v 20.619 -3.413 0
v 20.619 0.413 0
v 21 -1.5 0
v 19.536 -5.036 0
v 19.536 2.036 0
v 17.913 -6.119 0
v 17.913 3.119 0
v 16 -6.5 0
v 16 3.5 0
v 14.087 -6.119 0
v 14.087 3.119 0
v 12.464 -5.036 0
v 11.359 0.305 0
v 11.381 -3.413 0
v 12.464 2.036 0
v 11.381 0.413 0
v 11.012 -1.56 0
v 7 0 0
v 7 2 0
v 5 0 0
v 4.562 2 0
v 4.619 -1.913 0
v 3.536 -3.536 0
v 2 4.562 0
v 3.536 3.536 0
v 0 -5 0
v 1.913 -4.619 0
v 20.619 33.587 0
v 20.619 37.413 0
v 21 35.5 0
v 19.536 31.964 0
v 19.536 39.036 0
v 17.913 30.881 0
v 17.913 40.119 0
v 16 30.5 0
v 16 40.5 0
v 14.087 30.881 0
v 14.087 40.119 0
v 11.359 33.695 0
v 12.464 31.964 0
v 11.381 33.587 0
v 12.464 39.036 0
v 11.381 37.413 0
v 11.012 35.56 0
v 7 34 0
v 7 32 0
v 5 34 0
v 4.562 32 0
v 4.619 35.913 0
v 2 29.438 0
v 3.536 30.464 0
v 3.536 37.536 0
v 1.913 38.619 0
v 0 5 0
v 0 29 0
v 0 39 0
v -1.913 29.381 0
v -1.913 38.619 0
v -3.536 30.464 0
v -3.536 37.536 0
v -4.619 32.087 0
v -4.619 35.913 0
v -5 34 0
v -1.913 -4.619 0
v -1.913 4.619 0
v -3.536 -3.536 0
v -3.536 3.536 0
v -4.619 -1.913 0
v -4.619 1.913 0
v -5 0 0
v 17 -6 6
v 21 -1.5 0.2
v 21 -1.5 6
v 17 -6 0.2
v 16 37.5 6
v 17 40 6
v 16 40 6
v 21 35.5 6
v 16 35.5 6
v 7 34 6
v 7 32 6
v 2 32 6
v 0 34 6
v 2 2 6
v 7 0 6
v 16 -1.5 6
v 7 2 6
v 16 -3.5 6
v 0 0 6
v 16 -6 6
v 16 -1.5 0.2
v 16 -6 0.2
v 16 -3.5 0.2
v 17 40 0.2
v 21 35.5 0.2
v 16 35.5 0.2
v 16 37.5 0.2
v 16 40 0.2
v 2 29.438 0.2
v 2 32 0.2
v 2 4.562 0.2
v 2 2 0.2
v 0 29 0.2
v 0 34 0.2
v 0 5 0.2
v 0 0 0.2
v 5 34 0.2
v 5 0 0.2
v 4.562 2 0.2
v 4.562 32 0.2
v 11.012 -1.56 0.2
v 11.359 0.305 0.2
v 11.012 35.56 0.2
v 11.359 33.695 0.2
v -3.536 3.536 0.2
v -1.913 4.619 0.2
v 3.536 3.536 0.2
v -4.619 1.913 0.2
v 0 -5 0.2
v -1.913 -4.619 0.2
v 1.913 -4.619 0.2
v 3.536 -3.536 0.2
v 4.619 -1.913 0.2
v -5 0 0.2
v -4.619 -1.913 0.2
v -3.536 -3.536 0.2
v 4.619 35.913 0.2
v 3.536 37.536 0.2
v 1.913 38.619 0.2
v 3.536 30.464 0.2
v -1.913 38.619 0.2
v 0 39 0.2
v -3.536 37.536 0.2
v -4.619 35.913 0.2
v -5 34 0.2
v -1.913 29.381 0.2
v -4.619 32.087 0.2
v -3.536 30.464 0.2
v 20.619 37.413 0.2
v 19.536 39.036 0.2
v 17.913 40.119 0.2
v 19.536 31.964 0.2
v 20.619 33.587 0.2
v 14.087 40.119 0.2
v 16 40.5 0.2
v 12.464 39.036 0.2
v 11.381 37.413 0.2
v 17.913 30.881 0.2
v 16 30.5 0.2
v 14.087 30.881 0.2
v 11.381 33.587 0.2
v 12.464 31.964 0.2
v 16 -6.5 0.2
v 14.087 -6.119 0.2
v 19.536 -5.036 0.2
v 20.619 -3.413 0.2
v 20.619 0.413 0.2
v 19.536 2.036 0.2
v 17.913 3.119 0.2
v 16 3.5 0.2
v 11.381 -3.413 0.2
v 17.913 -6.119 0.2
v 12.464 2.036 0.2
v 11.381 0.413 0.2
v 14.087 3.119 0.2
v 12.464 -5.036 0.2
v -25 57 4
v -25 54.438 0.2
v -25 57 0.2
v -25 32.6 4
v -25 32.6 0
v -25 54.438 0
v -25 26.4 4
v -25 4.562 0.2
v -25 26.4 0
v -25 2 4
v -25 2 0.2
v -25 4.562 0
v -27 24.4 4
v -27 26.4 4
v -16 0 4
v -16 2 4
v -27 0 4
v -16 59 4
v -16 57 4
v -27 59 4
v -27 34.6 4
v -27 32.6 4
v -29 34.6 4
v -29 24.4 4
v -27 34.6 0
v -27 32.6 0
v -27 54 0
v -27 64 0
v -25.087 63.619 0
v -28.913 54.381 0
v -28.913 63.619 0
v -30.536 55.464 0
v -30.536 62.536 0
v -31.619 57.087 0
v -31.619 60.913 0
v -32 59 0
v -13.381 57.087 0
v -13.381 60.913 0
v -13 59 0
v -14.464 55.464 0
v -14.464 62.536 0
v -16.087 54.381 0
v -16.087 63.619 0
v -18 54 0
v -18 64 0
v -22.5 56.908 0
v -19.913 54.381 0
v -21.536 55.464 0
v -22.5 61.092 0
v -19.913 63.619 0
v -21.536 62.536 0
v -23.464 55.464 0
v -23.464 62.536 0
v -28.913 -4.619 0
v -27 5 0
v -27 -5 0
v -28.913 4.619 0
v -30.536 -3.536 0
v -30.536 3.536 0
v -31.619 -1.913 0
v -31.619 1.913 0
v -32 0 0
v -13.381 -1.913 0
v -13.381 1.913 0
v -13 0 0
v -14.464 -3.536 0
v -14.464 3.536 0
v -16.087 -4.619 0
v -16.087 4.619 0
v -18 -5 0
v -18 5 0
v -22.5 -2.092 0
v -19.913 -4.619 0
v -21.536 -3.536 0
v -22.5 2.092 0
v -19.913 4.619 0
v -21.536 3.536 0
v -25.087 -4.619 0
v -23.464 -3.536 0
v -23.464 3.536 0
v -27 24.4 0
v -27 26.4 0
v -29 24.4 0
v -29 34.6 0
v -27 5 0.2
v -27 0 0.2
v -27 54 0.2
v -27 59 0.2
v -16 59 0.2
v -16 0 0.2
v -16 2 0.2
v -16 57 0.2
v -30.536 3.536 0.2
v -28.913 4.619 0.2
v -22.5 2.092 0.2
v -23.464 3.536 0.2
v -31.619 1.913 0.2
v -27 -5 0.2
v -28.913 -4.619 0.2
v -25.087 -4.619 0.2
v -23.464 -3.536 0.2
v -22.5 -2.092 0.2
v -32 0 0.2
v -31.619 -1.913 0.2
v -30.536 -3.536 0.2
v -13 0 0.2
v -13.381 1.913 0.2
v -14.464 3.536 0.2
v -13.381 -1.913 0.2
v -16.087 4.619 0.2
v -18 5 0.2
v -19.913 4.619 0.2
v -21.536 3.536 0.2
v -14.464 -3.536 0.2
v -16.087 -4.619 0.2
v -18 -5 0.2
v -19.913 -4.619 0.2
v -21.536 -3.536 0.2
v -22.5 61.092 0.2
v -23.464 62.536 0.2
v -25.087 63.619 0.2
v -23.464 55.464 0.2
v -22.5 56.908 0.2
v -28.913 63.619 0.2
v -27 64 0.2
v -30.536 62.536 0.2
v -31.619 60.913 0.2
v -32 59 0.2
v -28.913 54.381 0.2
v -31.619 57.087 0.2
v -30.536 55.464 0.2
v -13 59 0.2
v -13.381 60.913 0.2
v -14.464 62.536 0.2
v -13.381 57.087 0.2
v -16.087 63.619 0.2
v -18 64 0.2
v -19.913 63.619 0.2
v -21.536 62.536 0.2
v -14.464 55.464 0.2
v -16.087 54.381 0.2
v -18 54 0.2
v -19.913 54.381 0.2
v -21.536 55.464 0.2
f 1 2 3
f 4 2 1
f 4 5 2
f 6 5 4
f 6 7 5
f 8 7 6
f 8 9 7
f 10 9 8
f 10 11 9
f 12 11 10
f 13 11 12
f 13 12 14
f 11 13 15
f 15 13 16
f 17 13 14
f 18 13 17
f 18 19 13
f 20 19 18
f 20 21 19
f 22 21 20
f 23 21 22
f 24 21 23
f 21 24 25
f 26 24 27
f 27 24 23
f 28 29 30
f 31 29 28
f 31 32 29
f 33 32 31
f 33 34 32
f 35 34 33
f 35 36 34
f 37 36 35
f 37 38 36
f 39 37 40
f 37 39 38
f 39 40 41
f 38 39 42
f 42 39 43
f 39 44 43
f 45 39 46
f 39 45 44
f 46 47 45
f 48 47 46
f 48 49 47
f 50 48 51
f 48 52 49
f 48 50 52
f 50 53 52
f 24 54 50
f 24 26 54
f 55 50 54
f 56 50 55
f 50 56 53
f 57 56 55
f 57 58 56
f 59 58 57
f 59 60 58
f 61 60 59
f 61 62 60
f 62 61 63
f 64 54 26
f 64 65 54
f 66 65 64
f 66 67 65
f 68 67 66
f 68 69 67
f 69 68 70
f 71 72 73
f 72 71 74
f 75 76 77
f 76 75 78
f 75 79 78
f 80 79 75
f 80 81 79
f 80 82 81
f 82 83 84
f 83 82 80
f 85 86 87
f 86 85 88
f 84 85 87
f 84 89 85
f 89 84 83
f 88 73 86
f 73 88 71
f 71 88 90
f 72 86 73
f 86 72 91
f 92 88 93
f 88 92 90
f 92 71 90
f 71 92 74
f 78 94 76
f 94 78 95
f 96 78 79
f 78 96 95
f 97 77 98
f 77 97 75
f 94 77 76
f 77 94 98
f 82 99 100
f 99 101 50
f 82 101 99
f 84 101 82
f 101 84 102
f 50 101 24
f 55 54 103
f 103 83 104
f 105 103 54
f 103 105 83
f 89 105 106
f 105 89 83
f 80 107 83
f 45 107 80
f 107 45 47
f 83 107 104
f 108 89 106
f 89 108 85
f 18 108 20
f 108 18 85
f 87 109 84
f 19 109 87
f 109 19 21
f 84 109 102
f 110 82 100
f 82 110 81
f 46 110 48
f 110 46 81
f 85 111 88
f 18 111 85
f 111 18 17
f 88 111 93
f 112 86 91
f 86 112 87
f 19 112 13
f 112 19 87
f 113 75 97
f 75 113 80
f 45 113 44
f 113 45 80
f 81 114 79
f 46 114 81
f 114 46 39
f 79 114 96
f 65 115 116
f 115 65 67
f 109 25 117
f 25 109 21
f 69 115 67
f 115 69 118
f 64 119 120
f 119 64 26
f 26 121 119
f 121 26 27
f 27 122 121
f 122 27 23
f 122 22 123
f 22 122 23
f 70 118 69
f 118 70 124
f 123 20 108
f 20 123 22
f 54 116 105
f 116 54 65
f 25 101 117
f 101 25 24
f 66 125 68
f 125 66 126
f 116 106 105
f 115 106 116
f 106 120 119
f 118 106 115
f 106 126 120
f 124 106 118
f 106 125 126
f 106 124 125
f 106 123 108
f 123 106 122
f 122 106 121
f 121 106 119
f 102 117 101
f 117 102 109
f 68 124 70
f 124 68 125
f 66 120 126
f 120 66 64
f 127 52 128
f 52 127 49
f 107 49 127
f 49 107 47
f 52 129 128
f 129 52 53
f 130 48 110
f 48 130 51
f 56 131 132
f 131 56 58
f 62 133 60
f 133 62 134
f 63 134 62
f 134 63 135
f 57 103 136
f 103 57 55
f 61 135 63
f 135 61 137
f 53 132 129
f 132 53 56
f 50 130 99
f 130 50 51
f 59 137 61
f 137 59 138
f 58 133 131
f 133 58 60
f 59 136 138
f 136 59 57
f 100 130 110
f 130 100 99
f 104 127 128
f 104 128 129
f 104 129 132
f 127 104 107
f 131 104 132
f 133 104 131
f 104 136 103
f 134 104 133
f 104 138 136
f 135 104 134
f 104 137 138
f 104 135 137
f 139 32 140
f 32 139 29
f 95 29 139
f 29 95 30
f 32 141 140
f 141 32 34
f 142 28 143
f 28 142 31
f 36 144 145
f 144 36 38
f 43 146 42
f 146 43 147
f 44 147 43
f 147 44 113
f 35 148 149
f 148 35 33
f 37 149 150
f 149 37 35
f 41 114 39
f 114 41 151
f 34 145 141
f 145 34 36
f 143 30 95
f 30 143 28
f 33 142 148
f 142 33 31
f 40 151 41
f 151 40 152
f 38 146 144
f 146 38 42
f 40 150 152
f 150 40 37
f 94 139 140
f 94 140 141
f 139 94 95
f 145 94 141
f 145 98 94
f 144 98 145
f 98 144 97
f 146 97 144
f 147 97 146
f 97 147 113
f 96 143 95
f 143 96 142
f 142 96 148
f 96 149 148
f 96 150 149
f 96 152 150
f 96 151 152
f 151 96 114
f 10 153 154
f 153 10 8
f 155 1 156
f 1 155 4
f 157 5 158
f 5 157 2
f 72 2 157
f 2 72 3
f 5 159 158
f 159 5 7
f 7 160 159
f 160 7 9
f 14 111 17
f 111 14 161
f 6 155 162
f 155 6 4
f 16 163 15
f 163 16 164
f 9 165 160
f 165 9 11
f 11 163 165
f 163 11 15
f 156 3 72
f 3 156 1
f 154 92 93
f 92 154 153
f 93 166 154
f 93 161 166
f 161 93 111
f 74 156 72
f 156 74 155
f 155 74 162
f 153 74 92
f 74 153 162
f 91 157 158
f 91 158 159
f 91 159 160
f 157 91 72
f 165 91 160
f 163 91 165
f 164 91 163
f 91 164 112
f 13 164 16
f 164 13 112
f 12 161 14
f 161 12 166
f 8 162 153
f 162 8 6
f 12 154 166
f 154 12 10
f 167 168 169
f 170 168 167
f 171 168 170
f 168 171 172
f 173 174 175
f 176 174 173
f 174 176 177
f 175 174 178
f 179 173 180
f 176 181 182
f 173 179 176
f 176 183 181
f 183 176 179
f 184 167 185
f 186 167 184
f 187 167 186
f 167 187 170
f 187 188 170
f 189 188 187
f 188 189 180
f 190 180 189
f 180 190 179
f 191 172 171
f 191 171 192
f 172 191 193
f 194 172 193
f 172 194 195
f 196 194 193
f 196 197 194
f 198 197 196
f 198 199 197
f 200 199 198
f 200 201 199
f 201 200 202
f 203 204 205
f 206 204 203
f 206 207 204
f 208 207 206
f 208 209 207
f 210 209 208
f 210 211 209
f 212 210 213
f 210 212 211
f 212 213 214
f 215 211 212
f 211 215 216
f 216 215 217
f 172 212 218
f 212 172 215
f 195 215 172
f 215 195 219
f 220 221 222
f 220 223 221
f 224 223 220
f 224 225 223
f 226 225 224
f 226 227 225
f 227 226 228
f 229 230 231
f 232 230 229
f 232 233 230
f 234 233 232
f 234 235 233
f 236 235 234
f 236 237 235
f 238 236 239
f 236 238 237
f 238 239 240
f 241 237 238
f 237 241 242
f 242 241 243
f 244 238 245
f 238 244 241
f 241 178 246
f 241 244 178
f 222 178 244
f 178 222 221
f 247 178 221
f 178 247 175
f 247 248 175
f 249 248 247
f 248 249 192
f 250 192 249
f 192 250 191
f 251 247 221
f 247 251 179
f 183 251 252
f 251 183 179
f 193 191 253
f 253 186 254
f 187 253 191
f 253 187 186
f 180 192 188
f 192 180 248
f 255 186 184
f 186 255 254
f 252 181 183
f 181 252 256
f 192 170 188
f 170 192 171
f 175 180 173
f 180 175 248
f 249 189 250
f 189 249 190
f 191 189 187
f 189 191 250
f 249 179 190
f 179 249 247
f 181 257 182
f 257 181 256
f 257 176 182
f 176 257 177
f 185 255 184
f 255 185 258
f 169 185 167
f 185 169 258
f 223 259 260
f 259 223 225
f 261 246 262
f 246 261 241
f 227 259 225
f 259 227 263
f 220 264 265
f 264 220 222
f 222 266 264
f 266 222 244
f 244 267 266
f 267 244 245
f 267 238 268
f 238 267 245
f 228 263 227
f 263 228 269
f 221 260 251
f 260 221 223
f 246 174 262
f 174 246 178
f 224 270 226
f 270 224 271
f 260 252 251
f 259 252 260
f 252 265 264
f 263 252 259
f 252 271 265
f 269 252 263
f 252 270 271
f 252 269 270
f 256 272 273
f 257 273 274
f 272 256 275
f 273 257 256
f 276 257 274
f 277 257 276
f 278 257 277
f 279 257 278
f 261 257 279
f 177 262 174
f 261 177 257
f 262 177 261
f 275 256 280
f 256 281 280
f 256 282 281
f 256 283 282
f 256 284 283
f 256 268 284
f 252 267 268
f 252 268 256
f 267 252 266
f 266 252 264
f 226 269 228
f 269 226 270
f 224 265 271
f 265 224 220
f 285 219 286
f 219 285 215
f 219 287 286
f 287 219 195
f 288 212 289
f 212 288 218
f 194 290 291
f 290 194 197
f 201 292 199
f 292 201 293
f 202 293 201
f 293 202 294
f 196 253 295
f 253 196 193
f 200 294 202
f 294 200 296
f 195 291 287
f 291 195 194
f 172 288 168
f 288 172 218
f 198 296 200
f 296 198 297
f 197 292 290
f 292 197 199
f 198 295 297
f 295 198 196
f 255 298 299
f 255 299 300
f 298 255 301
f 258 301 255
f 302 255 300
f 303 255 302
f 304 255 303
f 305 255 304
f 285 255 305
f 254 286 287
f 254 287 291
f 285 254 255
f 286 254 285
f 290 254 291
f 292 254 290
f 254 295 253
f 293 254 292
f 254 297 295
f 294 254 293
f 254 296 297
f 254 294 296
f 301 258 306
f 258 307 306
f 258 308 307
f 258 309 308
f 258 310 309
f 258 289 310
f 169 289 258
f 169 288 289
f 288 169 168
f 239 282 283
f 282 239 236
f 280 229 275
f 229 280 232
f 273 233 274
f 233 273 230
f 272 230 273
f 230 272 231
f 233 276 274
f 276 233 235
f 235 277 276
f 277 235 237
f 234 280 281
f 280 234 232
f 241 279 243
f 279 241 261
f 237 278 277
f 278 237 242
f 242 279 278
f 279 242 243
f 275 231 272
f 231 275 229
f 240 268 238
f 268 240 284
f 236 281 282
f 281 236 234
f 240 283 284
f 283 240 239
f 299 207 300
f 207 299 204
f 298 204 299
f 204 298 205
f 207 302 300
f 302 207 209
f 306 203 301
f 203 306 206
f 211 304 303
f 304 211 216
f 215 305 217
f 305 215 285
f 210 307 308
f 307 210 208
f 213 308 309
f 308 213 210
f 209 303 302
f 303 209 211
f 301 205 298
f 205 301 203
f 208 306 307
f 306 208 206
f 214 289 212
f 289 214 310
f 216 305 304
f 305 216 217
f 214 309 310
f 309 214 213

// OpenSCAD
// Matches turnigy nano-tech 2S 460mAh 25-40C
battery_width = 30;
battery_length = 55;
battery_height = 11;

// Matches two turnigy nano-tech 1S 750mAh 35-70C back-to-back
//battery_width = 27;
//battery_length = 44;
//battery_height = 25.5;

// general 'strength' of parts
wall_size = 2;

// part A (clipping into frame)
// heightA: 6mm originally, 8mm+ for higher batteries
heightA = 6; // width of the main battery touching part
// fixed_part_length: 5mm originally, 15mm+ for longer batteries
fixed_part_length = 5; // non-angled clip part
distance_to_top = 3; // distance between battery top and frame bottom (FC screw head height)
distance_at_top = 41; // distance between clip 'prongs' on holding end
helper_width = 4.5; // triangle-guide overlap
helper_height = 4; // triangle-guide height
helper_offset = 1; // triangle-guide base height

// part B, glued to part A
heightB = 4; // width of the long support bar
small_arm_length = 9; // height of arms holding battery at long ends
cutout_length = heightA + 0.2; // heightA + some clearance
support_length = cutout_length + (2 * wall_size); // length of bar under the cutout (where glue goes)

// calculation helpers
real_height = battery_height + distance_to_top;
dynamic_part_length = real_height - fixed_part_length;
dynamic_part_width = ((distance_at_top - battery_width) / 2) - wall_size;

// print support helpers
helper_disc_diameter = 10;
helper_disc_height = 0.2;

module dynamicPart() {
    points = [
        [  0,  0,  0 ], // 0
        [ dynamic_part_length,  -dynamic_part_width,  0 ], // 1
        [ dynamic_part_length,  wall_size - dynamic_part_width,  0 ], // 2
        [  0,  wall_size,  0 ], // 3
        [  0,  0,  heightA ], // 4
        [ dynamic_part_length,  -dynamic_part_width,  heightA ], // 5
        [ dynamic_part_length,  wall_size - dynamic_part_width,  heightA ], // 6
        [  0,  wall_size,  heightA ]]; // 7
  
    faces = [
        [ 0, 1, 2, 3 ],  // bottom
        [ 4, 5, 1, 0 ],  // front
        [ 7, 6, 5, 4 ],  // top
        [ 5, 6, 2, 1 ],  // right
        [ 6, 7, 3, 2 ],  // back
        [ 7, 4, 0, 3 ]]; // left
    
    polyhedron(points, faces);
}

module helper() {
    points = [
        [  0,  0,  0 ], // 0
        [ helper_height,  helper_width,  0 ], // 1
        [ 0,  helper_width,  0 ], // 2
        [  0,  0,  heightA ], // 3
        [ helper_height,  helper_width,  heightA ], // 4
        [ 0,  helper_width,  heightA ]]; // 5
  
    faces = [
        [ 0, 1, 2 ],     // bottom
        [ 5, 4, 3 ],     // top
        [ 2, 1, 4, 5 ],  // right
        [ 0, 2, 5, 3 ],  // back
        [ 3, 4, 1, 0 ]]; // left
    
    translate([helper_offset, 0, 0])
        polyhedron(points, faces);
    
    cube([helper_offset, helper_width, heightA]);
}

module partA() {
    // central part
    cube([wall_size, battery_width + (2 * wall_size), heightA]);
    
    // fixed parts
    translate([wall_size, 0, 0])
        cube([fixed_part_length, wall_size, heightA]);
    
    translate([wall_size, battery_width + wall_size, 0])
        cube([fixed_part_length, wall_size, heightA]);
    
    // dynamic parts
    translate([wall_size + fixed_part_length, 0, 0])
        dynamicPart();
    
    translate([wall_size + fixed_part_length, battery_width + (2 * wall_size), heightA])
        rotate([180, 0, 0])
            dynamicPart();
    
    // top guides
    translate([wall_size + fixed_part_length + dynamic_part_length, -dynamic_part_width - helper_width + wall_size, 0])
    helper();
    
    translate([wall_size + fixed_part_length + dynamic_part_length, battery_width + dynamic_part_width + helper_width + wall_size, heightA])
        rotate([180, 0, 0])
        helper();
        
    cylinder(d = helper_disc_diameter, h = helper_disc_height);
    
    translate([0, battery_width + (2 * wall_size), 0])
        cylinder(d = helper_disc_diameter, h = helper_disc_height);
        
    translate([wall_size + fixed_part_length + dynamic_part_length, battery_width + dynamic_part_width + wall_size, 0])
        cylinder(d = helper_disc_diameter, h = helper_disc_height);
    
    translate([wall_size + fixed_part_length + dynamic_part_length, -dynamic_part_width + wall_size, 0])
        cylinder(d = helper_disc_diameter, h = helper_disc_height);
}

module partB() {
    // central part
    difference() {
        cube([wall_size, battery_length + (2 * wall_size), heightB]);
        
        translate([-1, wall_size + ((battery_length - cutout_length) / 2), -1])
            cube([wall_size + 2, cutout_length, heightB + 2]);
    }
    
    // support
    translate([-wall_size, wall_size + ((battery_length - support_length) / 2), 0])
        cube([wall_size, support_length, heightB]);
    
    // lower arm
    translate([wall_size, 0, 0])
        cube([small_arm_length, wall_size, heightB]);
    
    // upper arm
    translate([wall_size, battery_length + wall_size, 0])
        cube([small_arm_length, wall_size, heightB]);
    
    cylinder(d = helper_disc_diameter, h = helper_disc_height);
    
    translate([0, battery_length + (2 * wall_size), 0])
        cylinder(d = helper_disc_diameter, h = helper_disc_height);
    
    translate([small_arm_length, 0, 0])
        cylinder(d = helper_disc_diameter, h = helper_disc_height);
    
    translate([small_arm_length, battery_length + (2 * wall_size), 0])
        cylinder(d = helper_disc_diameter, h = helper_disc_height);
}

// ---------------------------------------

partA();

translate([-3 * small_arm_length, 0, 0])
    partB();

// ---------------------------------------

// Visualization:
/*
translate([0, heightB / 2, 0])
rotate([0, -90, 90])
    partA();

translate([(-battery_width + heightB) / 2 - wall_size, (-battery_length - wall_size) / 2 - wall_size, 0])
rotate([0, -90, 0])
    partB();

%translate([-(battery_width + heightB) / 2, -1, battery_height / 2 + wall_size])
    cube([battery_width, battery_length, battery_height], true);

%translate([-(battery_width + heightB) / 2, -1, battery_height + wall_size + distance_to_top - 1])
    cube([battery_width, battery_length, 1], true);
*/
